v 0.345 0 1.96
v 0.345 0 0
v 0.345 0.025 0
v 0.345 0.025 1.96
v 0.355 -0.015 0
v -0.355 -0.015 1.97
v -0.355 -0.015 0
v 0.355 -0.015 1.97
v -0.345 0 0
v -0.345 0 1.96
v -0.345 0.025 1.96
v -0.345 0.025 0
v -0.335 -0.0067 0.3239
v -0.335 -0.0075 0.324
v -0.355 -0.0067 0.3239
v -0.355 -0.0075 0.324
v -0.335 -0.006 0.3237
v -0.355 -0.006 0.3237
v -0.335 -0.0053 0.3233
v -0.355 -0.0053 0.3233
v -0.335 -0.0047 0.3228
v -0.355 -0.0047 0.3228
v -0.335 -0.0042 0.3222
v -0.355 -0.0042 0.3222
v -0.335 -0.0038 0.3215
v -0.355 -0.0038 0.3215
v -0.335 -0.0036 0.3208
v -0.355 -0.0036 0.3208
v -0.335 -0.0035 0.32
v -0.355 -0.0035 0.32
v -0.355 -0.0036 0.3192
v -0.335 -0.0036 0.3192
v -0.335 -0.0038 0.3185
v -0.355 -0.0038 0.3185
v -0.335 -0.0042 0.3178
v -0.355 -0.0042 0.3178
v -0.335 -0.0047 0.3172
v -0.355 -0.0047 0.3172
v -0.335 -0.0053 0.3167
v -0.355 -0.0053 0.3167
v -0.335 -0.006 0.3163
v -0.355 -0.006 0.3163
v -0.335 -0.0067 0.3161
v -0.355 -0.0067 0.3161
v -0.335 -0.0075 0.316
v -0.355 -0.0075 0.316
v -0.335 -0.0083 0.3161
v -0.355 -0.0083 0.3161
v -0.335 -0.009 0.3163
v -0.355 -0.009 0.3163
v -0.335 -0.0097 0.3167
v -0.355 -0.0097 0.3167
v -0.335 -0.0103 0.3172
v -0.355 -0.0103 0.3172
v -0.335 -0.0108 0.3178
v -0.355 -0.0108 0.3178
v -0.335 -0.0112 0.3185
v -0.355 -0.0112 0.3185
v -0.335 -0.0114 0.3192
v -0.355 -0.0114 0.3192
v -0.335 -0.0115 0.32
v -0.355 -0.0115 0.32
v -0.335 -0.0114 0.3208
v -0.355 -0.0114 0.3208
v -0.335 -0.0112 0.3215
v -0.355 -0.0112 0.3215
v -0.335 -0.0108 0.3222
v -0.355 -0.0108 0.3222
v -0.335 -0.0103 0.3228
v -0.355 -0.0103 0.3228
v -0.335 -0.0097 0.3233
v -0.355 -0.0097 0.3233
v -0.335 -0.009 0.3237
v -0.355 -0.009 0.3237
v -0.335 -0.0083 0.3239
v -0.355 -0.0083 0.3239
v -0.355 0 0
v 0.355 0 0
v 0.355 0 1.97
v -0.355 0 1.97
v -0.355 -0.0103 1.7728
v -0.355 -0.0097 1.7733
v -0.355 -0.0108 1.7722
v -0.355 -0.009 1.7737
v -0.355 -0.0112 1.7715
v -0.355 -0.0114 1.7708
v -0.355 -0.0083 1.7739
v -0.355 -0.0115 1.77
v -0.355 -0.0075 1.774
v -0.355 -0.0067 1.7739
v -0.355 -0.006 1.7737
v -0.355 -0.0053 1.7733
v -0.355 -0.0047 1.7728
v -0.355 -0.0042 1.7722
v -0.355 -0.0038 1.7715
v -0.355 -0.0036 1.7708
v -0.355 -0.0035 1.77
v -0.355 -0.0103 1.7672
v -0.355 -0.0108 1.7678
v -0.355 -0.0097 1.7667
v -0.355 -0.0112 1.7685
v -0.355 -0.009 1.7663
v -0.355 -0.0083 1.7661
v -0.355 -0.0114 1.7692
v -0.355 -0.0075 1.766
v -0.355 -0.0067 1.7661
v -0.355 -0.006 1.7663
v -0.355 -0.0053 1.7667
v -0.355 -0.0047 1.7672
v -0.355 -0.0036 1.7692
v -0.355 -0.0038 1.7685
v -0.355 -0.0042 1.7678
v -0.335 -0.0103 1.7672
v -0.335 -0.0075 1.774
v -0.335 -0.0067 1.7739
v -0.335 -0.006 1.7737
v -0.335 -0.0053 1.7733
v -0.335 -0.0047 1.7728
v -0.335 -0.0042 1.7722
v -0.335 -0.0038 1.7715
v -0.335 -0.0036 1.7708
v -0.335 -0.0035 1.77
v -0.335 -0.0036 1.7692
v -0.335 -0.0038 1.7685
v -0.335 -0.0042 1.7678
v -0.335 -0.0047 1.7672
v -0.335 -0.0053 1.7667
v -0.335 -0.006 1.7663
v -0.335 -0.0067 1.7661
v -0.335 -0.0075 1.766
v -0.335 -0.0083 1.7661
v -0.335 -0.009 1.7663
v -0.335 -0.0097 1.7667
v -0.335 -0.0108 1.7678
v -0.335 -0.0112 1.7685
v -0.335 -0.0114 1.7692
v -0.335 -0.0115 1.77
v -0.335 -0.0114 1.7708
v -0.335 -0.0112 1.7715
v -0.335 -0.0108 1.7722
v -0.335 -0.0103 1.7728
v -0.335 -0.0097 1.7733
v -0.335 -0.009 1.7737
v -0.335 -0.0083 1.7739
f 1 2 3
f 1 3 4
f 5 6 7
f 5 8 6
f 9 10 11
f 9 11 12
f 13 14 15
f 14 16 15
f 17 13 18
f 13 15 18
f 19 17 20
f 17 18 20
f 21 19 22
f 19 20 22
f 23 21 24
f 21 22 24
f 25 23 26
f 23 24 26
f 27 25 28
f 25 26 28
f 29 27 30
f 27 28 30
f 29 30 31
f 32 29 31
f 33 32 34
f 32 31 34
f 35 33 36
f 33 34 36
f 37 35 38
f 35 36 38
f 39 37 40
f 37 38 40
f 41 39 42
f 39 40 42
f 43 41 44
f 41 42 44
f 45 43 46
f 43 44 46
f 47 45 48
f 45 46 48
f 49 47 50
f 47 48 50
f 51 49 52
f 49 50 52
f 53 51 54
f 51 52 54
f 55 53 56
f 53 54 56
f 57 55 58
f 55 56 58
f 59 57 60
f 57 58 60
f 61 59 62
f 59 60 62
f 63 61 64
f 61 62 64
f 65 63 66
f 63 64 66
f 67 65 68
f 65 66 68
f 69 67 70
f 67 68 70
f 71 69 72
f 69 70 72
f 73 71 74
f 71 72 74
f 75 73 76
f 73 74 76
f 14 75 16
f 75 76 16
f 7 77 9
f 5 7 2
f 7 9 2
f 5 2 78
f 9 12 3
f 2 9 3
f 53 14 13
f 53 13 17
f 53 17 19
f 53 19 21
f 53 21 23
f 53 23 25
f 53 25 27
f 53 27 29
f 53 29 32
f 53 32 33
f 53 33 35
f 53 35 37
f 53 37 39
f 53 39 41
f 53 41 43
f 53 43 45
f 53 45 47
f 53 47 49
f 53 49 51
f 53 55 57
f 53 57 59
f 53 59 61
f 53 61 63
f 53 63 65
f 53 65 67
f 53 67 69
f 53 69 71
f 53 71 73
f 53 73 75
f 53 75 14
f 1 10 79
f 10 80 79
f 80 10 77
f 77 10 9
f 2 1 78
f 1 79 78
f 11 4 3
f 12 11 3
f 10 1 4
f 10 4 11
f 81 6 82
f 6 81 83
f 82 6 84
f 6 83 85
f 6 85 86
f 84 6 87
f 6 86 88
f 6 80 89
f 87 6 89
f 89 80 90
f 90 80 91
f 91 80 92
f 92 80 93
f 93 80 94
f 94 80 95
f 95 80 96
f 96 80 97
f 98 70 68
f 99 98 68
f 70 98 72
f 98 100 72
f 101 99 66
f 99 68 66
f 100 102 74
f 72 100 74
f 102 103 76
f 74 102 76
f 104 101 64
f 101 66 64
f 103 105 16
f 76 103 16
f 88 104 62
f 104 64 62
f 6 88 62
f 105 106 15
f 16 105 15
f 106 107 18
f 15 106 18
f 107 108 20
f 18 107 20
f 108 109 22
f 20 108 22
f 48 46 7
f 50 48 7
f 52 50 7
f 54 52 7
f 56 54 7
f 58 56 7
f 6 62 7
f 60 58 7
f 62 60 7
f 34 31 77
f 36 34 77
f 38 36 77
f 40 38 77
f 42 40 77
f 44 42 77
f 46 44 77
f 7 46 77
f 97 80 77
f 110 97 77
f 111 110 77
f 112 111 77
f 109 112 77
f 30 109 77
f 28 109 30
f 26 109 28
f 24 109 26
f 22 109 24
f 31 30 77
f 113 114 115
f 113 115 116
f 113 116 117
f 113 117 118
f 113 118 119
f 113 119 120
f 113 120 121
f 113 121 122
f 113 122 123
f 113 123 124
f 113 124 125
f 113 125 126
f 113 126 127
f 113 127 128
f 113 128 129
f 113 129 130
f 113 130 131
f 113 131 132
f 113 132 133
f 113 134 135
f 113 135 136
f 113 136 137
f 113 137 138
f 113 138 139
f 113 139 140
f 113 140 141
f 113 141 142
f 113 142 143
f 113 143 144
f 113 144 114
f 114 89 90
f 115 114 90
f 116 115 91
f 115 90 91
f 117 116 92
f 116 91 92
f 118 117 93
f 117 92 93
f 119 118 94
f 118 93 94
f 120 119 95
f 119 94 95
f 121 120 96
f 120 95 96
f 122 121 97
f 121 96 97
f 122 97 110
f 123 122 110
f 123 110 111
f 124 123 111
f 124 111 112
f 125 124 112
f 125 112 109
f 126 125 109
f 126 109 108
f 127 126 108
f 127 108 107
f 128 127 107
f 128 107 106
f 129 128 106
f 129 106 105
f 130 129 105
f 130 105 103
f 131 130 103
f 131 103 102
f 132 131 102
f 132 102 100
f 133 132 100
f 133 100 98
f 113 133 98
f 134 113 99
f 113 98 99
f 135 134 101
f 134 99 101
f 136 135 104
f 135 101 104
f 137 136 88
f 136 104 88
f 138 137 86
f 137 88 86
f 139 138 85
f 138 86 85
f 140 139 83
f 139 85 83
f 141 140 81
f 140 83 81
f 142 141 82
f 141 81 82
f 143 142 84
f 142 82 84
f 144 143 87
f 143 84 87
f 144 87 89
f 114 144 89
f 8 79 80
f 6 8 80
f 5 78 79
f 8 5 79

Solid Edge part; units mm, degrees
sketch "Sketch1" plane through (0, 0, 0) normal (0, -1, 0) x (1, 0, 0)
  line L0 (-0.345, 0) -> (0.345, 0)
  line L1 (0.345, 0) -> (0.345, 1.96)
  line L2 (0.345, 1.96) -> (-0.345, 1.96)
  line L3 (-0.345, 1.96) -> (-0.345, 0)
  dimension "D1" = 1.96
  dimension "D2" = 0.69
extrude "Protrusion1" add sketch "Sketch1" against normal blind 0.025
sketch "Sketch2" plane through (0, 0, 0.98) normal (0, -1, 0) x (1, 0, 0)
  line L0 (-0.355, -0.98) -> (0.355, -0.98)
  line L1 (0.355, -0.98) -> (0.355, 0.99)
  line L2 (0.355, 0.99) -> (-0.355, 0.99)
  line L3 (-0.355, 0.99) -> (-0.355, -0.98)
extrude "Ausprägung_2" add sketch "Sketch2" along normal blind 0.015
sketch "Sketch3" plane through (-0.355, -0.0075, 0.985) normal (-1, 0, 0) x (0, 0, 1)
  circle A0 centre (0.785, 0) radius 0.004
  circle A1 centre (-0.665, 0) radius 0.004
  dimension "D1" = 0.008
  dimension "D2" = 0.32
  dimension "D3" = 0.0075
  dimension "D4" = 1.45
extrude "Ausschnitt_1" cut sketch "Sketch3" against normal blind 0.02
extrude "Cutout1" [suppressed]
extrude "Ausprägung_3" [suppressed]
